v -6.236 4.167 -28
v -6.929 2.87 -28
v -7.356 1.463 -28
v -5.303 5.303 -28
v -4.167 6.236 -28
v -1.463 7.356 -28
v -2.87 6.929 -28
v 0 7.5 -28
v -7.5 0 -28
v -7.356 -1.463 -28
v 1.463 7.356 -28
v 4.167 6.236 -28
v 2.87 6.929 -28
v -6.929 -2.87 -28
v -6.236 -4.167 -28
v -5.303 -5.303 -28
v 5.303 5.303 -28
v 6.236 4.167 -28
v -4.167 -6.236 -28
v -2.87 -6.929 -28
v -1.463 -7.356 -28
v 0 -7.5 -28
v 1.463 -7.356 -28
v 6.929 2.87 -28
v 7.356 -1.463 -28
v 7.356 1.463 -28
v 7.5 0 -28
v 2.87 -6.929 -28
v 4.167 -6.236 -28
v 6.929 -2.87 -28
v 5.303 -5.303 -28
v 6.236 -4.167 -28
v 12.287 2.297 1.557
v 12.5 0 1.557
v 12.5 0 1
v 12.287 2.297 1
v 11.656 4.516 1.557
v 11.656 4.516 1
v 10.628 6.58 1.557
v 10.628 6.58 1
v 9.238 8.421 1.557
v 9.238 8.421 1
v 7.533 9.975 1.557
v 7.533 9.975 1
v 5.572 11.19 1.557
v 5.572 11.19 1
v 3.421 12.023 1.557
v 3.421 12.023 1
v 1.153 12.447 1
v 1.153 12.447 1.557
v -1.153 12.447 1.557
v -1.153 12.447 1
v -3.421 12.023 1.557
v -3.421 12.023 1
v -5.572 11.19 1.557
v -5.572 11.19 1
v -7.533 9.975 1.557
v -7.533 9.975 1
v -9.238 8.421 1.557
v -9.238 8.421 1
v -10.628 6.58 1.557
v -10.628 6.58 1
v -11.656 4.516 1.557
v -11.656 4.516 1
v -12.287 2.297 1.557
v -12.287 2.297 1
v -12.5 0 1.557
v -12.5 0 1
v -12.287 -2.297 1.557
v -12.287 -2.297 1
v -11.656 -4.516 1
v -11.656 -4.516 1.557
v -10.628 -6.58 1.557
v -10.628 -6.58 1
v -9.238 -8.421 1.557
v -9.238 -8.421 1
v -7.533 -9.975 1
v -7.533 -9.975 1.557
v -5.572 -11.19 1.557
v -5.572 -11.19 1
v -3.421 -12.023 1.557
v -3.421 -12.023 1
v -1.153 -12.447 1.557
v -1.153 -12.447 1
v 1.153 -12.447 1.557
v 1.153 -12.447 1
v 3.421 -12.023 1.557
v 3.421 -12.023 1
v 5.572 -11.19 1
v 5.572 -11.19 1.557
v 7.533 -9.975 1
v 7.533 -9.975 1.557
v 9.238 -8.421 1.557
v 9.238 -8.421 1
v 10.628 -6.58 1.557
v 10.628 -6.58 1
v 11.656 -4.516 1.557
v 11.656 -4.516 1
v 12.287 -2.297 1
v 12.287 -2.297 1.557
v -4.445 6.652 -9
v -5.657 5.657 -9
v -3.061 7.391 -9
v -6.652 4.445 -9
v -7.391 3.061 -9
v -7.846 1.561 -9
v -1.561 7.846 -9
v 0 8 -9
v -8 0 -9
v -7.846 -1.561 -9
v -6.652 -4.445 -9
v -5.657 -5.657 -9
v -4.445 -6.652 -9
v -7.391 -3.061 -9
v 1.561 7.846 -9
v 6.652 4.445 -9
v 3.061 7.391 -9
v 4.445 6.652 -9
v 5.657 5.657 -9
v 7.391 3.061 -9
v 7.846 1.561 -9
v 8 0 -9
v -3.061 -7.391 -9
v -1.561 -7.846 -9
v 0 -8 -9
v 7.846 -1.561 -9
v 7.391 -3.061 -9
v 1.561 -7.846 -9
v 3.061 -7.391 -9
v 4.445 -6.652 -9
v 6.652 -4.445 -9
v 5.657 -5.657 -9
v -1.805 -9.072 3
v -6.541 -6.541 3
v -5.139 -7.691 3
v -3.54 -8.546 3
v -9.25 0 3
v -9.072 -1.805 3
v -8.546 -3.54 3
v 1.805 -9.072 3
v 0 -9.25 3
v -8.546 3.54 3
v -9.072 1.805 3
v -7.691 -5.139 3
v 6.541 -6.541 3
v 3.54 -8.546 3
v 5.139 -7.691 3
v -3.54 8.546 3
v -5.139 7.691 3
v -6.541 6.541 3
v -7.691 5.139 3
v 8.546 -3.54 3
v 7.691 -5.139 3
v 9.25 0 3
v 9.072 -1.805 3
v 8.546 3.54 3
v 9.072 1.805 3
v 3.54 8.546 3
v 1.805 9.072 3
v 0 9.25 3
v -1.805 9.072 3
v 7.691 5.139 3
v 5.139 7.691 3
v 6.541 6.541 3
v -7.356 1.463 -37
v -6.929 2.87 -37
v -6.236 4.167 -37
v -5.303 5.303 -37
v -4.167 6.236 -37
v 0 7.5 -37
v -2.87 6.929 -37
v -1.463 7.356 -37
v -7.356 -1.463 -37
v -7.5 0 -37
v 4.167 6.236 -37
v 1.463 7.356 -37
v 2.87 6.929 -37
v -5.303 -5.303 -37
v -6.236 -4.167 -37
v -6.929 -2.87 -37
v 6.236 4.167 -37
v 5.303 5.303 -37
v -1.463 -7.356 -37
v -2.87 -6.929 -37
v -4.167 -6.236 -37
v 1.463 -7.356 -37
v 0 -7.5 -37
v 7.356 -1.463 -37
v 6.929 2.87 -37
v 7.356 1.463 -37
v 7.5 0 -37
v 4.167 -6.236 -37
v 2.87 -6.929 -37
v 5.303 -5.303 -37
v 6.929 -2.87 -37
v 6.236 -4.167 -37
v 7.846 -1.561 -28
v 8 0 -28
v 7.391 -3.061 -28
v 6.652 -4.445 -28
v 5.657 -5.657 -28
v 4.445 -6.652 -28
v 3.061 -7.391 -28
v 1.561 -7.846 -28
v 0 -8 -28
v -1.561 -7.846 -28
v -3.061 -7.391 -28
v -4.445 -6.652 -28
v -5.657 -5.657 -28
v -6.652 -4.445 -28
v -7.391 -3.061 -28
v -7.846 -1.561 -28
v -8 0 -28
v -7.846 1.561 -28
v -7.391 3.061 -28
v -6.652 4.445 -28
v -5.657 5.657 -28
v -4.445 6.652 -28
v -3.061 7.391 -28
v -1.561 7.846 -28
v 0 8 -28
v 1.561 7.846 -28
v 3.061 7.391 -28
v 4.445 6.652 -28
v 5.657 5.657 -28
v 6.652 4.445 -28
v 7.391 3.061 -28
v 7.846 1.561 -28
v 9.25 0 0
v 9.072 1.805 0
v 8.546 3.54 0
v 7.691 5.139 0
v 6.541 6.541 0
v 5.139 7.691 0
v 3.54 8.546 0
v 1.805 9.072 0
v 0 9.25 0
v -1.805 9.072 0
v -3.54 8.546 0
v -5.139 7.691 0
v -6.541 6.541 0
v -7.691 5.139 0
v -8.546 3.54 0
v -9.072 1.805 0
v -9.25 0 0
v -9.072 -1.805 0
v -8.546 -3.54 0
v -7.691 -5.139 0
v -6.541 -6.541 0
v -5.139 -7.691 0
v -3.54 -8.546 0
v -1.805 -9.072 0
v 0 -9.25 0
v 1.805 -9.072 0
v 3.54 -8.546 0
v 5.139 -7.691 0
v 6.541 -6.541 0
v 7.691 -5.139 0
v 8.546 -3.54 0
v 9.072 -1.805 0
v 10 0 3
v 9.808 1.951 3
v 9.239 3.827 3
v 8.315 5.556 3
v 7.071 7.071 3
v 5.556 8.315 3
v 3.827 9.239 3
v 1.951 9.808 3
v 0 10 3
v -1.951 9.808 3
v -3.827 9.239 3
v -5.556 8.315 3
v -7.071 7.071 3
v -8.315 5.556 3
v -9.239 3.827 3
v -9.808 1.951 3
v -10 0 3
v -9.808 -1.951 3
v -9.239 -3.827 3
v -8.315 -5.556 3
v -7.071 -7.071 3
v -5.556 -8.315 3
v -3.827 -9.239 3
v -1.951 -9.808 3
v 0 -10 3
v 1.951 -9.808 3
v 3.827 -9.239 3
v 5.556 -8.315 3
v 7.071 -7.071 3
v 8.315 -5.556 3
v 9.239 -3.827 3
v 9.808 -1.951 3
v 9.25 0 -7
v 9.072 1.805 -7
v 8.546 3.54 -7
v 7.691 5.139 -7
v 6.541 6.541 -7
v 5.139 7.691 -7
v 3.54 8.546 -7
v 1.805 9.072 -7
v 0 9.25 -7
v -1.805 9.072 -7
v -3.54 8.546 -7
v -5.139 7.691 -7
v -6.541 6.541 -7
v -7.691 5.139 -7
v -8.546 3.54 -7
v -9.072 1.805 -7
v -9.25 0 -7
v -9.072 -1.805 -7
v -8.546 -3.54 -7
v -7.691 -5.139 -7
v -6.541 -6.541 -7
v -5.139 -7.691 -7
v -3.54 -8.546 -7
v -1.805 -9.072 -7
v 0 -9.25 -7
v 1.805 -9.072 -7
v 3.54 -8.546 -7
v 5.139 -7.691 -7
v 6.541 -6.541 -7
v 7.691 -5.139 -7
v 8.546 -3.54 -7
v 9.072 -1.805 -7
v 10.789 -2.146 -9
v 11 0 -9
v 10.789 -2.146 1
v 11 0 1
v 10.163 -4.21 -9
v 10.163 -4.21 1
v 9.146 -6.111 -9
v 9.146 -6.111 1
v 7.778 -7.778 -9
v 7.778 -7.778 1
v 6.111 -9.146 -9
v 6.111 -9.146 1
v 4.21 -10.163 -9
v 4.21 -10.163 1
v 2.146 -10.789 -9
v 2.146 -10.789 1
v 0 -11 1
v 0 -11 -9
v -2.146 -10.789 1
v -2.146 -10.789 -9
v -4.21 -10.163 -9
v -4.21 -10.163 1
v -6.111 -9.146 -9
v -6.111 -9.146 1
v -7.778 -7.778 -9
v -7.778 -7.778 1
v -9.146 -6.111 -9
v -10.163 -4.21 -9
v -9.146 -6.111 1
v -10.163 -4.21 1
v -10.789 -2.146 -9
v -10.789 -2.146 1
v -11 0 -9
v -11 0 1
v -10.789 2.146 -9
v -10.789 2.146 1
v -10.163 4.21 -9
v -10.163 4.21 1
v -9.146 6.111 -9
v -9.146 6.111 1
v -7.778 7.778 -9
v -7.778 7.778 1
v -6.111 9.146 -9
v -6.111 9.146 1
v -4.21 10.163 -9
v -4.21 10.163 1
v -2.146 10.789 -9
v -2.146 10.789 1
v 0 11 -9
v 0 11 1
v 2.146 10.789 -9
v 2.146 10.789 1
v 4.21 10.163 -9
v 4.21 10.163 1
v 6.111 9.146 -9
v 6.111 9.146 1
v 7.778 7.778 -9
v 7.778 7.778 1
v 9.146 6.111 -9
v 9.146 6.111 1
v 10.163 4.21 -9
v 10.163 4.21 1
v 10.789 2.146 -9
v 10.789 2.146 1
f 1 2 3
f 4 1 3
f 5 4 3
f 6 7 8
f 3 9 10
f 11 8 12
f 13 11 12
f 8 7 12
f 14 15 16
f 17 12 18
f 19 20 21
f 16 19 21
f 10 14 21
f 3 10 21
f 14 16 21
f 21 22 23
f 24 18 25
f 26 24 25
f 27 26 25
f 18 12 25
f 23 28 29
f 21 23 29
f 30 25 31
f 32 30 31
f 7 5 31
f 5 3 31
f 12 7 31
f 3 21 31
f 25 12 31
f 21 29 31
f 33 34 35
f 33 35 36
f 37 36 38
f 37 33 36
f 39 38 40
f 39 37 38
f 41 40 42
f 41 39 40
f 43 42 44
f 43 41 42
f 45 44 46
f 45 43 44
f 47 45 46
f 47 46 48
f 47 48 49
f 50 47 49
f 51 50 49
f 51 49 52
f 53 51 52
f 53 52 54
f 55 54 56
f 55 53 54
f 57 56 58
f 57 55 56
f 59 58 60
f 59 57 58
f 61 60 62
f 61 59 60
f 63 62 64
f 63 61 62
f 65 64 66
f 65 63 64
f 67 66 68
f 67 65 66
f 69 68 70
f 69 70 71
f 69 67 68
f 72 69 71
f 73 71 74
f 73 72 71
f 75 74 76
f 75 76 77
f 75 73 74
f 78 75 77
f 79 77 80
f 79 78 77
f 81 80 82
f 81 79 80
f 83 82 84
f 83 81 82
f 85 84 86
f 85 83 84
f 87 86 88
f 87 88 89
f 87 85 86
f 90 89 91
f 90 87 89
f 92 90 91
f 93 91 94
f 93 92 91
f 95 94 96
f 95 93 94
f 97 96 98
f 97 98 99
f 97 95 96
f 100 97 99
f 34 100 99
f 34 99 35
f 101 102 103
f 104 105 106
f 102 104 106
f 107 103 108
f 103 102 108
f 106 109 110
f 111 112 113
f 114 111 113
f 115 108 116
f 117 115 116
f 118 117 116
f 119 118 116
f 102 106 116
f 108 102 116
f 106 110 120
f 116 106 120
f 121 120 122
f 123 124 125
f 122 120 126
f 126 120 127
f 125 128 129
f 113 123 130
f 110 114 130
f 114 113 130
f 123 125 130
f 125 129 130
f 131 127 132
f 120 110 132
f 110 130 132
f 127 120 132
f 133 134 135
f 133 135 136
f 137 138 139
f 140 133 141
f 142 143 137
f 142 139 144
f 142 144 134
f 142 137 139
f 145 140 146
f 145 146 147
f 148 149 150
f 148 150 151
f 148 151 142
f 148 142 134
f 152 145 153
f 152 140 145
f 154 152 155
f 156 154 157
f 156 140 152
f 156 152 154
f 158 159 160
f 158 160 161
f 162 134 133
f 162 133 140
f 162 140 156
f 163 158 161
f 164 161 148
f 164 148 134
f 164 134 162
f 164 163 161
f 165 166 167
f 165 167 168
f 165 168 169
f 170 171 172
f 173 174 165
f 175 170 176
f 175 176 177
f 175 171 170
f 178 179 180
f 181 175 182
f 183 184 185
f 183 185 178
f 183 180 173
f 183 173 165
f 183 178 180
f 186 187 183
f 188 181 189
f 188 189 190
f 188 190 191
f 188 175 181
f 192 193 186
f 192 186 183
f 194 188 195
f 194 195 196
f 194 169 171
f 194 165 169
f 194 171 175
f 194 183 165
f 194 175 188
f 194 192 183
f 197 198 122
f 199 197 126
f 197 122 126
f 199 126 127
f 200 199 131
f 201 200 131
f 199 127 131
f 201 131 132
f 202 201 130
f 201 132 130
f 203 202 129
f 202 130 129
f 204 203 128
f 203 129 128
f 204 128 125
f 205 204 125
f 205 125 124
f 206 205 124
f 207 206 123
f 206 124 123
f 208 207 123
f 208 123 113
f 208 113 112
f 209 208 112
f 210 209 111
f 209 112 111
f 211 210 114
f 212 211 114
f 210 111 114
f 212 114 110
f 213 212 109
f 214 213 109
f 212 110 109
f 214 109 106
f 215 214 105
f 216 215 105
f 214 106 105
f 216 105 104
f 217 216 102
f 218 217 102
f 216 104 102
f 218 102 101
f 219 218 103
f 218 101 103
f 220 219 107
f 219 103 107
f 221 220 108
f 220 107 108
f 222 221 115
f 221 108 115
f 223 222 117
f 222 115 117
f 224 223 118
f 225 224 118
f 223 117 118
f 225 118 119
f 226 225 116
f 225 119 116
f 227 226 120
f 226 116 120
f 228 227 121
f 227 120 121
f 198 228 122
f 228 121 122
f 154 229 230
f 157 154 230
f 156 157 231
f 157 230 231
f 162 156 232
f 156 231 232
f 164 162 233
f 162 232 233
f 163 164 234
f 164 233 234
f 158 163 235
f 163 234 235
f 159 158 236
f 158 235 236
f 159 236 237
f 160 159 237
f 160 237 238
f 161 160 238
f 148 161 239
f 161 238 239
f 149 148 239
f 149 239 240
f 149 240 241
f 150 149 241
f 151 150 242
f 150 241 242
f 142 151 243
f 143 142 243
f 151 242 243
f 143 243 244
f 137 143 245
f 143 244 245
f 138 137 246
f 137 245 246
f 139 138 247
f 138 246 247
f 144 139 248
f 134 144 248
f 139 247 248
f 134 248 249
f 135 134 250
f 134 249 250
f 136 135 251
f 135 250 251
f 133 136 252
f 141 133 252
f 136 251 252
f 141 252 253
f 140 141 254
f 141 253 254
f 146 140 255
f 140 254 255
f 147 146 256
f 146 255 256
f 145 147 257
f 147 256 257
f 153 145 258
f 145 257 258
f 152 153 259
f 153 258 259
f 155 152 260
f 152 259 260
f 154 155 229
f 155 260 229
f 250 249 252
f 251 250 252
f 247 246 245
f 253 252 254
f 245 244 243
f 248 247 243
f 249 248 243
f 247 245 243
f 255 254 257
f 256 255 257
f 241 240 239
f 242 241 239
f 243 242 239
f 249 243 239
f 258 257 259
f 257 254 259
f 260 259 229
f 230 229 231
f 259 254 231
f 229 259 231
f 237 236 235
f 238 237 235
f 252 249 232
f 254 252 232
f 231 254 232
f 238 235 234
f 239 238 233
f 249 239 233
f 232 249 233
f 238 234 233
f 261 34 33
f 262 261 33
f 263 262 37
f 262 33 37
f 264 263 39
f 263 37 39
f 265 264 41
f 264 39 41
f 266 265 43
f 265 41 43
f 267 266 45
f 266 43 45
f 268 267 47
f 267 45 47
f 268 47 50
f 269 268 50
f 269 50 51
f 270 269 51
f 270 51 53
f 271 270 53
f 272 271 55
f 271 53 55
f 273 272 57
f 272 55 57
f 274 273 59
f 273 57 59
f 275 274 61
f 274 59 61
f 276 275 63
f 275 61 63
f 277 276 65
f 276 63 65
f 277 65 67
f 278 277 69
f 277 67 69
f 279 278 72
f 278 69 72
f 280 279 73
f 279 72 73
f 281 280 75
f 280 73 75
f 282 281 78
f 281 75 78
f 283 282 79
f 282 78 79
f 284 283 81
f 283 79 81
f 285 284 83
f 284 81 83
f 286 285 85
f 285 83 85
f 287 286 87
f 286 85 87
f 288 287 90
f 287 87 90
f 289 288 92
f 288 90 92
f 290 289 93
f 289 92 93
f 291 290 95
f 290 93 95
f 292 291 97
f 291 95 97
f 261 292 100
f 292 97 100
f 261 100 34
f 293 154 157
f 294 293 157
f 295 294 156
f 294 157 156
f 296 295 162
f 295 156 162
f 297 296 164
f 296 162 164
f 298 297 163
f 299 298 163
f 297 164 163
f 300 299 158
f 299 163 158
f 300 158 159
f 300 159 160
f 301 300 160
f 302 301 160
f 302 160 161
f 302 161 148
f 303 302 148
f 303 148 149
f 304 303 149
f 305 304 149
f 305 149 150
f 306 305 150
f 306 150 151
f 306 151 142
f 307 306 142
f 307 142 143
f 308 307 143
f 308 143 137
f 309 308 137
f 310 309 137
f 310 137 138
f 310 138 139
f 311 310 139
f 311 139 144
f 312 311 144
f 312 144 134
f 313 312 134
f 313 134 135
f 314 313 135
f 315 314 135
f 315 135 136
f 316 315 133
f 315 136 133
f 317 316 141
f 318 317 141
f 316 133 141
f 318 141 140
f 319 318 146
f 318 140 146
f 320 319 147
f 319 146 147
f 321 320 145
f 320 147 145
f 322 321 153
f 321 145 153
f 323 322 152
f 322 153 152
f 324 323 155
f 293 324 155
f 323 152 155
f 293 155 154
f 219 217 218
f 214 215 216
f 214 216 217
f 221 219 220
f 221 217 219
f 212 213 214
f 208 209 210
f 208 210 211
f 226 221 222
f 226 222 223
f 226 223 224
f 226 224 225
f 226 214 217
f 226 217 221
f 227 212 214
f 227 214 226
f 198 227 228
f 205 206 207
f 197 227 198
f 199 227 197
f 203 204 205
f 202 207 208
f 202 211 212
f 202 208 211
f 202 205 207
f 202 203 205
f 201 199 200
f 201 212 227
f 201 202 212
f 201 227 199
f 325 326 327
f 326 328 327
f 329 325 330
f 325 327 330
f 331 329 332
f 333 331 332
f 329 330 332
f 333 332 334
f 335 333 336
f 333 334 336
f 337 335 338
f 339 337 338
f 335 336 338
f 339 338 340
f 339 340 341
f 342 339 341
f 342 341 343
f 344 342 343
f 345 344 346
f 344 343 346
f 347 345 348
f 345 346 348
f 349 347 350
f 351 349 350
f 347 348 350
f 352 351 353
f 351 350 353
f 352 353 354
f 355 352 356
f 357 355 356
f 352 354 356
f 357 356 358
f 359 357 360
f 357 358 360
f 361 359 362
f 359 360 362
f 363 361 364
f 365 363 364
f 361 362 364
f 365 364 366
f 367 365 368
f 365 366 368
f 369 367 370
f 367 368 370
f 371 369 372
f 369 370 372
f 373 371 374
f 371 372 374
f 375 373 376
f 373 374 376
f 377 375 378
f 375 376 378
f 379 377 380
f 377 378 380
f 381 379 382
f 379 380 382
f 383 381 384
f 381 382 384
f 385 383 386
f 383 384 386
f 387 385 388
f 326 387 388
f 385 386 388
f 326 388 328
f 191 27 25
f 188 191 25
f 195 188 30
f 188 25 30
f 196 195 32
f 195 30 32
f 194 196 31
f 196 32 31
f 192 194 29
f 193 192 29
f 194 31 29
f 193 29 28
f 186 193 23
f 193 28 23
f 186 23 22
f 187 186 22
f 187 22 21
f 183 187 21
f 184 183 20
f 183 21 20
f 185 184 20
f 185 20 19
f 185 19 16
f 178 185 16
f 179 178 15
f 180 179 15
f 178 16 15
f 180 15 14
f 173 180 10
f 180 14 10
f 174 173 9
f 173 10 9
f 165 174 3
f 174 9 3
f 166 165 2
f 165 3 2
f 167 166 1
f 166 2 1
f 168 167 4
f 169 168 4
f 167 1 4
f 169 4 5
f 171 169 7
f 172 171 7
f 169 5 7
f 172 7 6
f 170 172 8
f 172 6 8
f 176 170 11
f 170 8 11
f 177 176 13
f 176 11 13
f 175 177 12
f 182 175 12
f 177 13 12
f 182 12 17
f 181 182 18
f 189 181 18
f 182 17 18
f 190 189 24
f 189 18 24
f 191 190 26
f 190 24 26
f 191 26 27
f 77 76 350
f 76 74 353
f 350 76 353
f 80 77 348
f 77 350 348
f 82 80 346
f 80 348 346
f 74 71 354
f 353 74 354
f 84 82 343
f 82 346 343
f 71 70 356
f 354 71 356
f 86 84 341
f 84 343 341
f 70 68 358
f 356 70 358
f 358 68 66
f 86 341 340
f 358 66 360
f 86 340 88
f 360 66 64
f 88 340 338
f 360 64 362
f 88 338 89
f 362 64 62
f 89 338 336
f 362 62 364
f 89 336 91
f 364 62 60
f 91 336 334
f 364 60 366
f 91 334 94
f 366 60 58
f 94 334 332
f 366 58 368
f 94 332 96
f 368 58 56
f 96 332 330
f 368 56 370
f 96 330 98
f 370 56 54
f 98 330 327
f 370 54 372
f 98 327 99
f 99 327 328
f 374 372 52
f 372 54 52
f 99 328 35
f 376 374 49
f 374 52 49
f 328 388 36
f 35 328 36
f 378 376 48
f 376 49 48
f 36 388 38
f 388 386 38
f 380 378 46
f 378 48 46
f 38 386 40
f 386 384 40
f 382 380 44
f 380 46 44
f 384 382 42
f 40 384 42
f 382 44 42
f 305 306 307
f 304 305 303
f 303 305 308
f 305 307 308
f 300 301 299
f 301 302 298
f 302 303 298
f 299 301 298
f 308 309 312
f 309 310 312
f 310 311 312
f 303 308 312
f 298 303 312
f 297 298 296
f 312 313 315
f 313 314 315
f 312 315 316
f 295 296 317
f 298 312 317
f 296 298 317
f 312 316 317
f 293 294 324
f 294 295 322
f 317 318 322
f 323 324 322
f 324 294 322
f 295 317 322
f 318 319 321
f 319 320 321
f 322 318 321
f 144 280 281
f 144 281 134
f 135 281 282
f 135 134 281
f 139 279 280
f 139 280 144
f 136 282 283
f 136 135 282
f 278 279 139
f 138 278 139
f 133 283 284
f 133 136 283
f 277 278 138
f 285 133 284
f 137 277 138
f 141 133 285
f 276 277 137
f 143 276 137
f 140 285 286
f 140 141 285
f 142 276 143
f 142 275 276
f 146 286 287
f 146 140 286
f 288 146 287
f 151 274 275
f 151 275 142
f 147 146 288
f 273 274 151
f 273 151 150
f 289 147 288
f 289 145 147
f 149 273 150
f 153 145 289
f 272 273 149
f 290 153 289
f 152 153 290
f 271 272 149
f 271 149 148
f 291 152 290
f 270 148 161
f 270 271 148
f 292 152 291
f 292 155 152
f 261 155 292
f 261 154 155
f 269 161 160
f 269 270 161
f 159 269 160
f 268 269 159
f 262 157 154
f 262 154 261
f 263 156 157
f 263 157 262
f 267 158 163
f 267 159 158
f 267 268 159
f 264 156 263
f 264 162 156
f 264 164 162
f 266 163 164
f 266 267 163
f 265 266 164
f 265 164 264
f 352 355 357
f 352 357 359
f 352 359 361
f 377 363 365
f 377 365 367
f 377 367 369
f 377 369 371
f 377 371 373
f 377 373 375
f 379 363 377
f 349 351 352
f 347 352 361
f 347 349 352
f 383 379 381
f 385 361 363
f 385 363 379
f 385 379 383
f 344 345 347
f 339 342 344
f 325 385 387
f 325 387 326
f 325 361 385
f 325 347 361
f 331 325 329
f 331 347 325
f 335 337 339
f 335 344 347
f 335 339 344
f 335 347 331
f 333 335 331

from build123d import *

# Parameters (mm, degrees)
F0_R      = 9.25
F1_DEPTH  = 3
F2_R      = 12.5
F2_R_2    = 9.25
F3_DEPTH  = 2
F4_R      = 11
F4_R_2    = 9.25
F5_DEPTH  = 10
F6_R      = 11
F7_DEPTH  = 2
F8_SIZE2  = 1.443375673
F8_SIZE   = 2.5
F9_R      = 8
F10_DEPTH = 19
F11_R     = 7.5
F12_DEPTH = 9


with BuildPart() as f1:
    # F0 (on Top) → F1 (new body)
    with BuildSketch(Plane.XY):
        Circle(F0_R)
    extrude(amount=F1_DEPTH)


with BuildPart() as f3:
    # F2 (on face) → F3 (new body)
    with BuildSketch(Plane.XY.offset(3)):
        Circle(F2_R)
        Circle(F2_R_2, mode=Mode.SUBTRACT)
    extrude(amount=-F3_DEPTH)

    # F4 (on face) → F5 (join)
    with BuildSketch(Plane(origin=(0, 0, 1), x_dir=(1, 0, 0), z_dir=(0, 0, -1))):
        Circle(F4_R)
        Circle(F4_R_2, mode=Mode.SUBTRACT)
    extrude(amount=F5_DEPTH)

    # F6 (on face) → F7 (join)
    with BuildSketch(Plane(origin=(0, 0, -9), x_dir=(1, 0, 0), z_dir=(0, 0, -1))):
        Circle(F6_R)
    extrude(amount=-F7_DEPTH)

    # F8
    f8_edges = [f3.edges().sort_by_distance(p)[0] for p in [
        (-12.5, 0, 3),
    ]]
    f8_side = f3.faces().sort_by_distance((-12.146447, 0, 3))[0]
    chamfer(f8_edges, length=F8_SIZE, length2=F8_SIZE2, reference=f8_side)


with BuildPart() as f10:
    # F9 (on face) → F10 (new body)
    with BuildSketch(Plane(origin=(0, 0, -9), x_dir=(1, 0, 0), z_dir=(0, 0, -1))):
        Circle(F9_R)
    extrude(amount=F10_DEPTH)


with BuildPart() as f12:
    # F11 (on face) → F12 (new body)
    with BuildSketch(Plane(origin=(0, 0, -28), x_dir=(1, 0, 0), z_dir=(0, 0, -1))):
        Circle(F11_R)
    extrude(amount=F12_DEPTH)


solid = Compound([f1.part, f3.part, f10.part, f12.part])
